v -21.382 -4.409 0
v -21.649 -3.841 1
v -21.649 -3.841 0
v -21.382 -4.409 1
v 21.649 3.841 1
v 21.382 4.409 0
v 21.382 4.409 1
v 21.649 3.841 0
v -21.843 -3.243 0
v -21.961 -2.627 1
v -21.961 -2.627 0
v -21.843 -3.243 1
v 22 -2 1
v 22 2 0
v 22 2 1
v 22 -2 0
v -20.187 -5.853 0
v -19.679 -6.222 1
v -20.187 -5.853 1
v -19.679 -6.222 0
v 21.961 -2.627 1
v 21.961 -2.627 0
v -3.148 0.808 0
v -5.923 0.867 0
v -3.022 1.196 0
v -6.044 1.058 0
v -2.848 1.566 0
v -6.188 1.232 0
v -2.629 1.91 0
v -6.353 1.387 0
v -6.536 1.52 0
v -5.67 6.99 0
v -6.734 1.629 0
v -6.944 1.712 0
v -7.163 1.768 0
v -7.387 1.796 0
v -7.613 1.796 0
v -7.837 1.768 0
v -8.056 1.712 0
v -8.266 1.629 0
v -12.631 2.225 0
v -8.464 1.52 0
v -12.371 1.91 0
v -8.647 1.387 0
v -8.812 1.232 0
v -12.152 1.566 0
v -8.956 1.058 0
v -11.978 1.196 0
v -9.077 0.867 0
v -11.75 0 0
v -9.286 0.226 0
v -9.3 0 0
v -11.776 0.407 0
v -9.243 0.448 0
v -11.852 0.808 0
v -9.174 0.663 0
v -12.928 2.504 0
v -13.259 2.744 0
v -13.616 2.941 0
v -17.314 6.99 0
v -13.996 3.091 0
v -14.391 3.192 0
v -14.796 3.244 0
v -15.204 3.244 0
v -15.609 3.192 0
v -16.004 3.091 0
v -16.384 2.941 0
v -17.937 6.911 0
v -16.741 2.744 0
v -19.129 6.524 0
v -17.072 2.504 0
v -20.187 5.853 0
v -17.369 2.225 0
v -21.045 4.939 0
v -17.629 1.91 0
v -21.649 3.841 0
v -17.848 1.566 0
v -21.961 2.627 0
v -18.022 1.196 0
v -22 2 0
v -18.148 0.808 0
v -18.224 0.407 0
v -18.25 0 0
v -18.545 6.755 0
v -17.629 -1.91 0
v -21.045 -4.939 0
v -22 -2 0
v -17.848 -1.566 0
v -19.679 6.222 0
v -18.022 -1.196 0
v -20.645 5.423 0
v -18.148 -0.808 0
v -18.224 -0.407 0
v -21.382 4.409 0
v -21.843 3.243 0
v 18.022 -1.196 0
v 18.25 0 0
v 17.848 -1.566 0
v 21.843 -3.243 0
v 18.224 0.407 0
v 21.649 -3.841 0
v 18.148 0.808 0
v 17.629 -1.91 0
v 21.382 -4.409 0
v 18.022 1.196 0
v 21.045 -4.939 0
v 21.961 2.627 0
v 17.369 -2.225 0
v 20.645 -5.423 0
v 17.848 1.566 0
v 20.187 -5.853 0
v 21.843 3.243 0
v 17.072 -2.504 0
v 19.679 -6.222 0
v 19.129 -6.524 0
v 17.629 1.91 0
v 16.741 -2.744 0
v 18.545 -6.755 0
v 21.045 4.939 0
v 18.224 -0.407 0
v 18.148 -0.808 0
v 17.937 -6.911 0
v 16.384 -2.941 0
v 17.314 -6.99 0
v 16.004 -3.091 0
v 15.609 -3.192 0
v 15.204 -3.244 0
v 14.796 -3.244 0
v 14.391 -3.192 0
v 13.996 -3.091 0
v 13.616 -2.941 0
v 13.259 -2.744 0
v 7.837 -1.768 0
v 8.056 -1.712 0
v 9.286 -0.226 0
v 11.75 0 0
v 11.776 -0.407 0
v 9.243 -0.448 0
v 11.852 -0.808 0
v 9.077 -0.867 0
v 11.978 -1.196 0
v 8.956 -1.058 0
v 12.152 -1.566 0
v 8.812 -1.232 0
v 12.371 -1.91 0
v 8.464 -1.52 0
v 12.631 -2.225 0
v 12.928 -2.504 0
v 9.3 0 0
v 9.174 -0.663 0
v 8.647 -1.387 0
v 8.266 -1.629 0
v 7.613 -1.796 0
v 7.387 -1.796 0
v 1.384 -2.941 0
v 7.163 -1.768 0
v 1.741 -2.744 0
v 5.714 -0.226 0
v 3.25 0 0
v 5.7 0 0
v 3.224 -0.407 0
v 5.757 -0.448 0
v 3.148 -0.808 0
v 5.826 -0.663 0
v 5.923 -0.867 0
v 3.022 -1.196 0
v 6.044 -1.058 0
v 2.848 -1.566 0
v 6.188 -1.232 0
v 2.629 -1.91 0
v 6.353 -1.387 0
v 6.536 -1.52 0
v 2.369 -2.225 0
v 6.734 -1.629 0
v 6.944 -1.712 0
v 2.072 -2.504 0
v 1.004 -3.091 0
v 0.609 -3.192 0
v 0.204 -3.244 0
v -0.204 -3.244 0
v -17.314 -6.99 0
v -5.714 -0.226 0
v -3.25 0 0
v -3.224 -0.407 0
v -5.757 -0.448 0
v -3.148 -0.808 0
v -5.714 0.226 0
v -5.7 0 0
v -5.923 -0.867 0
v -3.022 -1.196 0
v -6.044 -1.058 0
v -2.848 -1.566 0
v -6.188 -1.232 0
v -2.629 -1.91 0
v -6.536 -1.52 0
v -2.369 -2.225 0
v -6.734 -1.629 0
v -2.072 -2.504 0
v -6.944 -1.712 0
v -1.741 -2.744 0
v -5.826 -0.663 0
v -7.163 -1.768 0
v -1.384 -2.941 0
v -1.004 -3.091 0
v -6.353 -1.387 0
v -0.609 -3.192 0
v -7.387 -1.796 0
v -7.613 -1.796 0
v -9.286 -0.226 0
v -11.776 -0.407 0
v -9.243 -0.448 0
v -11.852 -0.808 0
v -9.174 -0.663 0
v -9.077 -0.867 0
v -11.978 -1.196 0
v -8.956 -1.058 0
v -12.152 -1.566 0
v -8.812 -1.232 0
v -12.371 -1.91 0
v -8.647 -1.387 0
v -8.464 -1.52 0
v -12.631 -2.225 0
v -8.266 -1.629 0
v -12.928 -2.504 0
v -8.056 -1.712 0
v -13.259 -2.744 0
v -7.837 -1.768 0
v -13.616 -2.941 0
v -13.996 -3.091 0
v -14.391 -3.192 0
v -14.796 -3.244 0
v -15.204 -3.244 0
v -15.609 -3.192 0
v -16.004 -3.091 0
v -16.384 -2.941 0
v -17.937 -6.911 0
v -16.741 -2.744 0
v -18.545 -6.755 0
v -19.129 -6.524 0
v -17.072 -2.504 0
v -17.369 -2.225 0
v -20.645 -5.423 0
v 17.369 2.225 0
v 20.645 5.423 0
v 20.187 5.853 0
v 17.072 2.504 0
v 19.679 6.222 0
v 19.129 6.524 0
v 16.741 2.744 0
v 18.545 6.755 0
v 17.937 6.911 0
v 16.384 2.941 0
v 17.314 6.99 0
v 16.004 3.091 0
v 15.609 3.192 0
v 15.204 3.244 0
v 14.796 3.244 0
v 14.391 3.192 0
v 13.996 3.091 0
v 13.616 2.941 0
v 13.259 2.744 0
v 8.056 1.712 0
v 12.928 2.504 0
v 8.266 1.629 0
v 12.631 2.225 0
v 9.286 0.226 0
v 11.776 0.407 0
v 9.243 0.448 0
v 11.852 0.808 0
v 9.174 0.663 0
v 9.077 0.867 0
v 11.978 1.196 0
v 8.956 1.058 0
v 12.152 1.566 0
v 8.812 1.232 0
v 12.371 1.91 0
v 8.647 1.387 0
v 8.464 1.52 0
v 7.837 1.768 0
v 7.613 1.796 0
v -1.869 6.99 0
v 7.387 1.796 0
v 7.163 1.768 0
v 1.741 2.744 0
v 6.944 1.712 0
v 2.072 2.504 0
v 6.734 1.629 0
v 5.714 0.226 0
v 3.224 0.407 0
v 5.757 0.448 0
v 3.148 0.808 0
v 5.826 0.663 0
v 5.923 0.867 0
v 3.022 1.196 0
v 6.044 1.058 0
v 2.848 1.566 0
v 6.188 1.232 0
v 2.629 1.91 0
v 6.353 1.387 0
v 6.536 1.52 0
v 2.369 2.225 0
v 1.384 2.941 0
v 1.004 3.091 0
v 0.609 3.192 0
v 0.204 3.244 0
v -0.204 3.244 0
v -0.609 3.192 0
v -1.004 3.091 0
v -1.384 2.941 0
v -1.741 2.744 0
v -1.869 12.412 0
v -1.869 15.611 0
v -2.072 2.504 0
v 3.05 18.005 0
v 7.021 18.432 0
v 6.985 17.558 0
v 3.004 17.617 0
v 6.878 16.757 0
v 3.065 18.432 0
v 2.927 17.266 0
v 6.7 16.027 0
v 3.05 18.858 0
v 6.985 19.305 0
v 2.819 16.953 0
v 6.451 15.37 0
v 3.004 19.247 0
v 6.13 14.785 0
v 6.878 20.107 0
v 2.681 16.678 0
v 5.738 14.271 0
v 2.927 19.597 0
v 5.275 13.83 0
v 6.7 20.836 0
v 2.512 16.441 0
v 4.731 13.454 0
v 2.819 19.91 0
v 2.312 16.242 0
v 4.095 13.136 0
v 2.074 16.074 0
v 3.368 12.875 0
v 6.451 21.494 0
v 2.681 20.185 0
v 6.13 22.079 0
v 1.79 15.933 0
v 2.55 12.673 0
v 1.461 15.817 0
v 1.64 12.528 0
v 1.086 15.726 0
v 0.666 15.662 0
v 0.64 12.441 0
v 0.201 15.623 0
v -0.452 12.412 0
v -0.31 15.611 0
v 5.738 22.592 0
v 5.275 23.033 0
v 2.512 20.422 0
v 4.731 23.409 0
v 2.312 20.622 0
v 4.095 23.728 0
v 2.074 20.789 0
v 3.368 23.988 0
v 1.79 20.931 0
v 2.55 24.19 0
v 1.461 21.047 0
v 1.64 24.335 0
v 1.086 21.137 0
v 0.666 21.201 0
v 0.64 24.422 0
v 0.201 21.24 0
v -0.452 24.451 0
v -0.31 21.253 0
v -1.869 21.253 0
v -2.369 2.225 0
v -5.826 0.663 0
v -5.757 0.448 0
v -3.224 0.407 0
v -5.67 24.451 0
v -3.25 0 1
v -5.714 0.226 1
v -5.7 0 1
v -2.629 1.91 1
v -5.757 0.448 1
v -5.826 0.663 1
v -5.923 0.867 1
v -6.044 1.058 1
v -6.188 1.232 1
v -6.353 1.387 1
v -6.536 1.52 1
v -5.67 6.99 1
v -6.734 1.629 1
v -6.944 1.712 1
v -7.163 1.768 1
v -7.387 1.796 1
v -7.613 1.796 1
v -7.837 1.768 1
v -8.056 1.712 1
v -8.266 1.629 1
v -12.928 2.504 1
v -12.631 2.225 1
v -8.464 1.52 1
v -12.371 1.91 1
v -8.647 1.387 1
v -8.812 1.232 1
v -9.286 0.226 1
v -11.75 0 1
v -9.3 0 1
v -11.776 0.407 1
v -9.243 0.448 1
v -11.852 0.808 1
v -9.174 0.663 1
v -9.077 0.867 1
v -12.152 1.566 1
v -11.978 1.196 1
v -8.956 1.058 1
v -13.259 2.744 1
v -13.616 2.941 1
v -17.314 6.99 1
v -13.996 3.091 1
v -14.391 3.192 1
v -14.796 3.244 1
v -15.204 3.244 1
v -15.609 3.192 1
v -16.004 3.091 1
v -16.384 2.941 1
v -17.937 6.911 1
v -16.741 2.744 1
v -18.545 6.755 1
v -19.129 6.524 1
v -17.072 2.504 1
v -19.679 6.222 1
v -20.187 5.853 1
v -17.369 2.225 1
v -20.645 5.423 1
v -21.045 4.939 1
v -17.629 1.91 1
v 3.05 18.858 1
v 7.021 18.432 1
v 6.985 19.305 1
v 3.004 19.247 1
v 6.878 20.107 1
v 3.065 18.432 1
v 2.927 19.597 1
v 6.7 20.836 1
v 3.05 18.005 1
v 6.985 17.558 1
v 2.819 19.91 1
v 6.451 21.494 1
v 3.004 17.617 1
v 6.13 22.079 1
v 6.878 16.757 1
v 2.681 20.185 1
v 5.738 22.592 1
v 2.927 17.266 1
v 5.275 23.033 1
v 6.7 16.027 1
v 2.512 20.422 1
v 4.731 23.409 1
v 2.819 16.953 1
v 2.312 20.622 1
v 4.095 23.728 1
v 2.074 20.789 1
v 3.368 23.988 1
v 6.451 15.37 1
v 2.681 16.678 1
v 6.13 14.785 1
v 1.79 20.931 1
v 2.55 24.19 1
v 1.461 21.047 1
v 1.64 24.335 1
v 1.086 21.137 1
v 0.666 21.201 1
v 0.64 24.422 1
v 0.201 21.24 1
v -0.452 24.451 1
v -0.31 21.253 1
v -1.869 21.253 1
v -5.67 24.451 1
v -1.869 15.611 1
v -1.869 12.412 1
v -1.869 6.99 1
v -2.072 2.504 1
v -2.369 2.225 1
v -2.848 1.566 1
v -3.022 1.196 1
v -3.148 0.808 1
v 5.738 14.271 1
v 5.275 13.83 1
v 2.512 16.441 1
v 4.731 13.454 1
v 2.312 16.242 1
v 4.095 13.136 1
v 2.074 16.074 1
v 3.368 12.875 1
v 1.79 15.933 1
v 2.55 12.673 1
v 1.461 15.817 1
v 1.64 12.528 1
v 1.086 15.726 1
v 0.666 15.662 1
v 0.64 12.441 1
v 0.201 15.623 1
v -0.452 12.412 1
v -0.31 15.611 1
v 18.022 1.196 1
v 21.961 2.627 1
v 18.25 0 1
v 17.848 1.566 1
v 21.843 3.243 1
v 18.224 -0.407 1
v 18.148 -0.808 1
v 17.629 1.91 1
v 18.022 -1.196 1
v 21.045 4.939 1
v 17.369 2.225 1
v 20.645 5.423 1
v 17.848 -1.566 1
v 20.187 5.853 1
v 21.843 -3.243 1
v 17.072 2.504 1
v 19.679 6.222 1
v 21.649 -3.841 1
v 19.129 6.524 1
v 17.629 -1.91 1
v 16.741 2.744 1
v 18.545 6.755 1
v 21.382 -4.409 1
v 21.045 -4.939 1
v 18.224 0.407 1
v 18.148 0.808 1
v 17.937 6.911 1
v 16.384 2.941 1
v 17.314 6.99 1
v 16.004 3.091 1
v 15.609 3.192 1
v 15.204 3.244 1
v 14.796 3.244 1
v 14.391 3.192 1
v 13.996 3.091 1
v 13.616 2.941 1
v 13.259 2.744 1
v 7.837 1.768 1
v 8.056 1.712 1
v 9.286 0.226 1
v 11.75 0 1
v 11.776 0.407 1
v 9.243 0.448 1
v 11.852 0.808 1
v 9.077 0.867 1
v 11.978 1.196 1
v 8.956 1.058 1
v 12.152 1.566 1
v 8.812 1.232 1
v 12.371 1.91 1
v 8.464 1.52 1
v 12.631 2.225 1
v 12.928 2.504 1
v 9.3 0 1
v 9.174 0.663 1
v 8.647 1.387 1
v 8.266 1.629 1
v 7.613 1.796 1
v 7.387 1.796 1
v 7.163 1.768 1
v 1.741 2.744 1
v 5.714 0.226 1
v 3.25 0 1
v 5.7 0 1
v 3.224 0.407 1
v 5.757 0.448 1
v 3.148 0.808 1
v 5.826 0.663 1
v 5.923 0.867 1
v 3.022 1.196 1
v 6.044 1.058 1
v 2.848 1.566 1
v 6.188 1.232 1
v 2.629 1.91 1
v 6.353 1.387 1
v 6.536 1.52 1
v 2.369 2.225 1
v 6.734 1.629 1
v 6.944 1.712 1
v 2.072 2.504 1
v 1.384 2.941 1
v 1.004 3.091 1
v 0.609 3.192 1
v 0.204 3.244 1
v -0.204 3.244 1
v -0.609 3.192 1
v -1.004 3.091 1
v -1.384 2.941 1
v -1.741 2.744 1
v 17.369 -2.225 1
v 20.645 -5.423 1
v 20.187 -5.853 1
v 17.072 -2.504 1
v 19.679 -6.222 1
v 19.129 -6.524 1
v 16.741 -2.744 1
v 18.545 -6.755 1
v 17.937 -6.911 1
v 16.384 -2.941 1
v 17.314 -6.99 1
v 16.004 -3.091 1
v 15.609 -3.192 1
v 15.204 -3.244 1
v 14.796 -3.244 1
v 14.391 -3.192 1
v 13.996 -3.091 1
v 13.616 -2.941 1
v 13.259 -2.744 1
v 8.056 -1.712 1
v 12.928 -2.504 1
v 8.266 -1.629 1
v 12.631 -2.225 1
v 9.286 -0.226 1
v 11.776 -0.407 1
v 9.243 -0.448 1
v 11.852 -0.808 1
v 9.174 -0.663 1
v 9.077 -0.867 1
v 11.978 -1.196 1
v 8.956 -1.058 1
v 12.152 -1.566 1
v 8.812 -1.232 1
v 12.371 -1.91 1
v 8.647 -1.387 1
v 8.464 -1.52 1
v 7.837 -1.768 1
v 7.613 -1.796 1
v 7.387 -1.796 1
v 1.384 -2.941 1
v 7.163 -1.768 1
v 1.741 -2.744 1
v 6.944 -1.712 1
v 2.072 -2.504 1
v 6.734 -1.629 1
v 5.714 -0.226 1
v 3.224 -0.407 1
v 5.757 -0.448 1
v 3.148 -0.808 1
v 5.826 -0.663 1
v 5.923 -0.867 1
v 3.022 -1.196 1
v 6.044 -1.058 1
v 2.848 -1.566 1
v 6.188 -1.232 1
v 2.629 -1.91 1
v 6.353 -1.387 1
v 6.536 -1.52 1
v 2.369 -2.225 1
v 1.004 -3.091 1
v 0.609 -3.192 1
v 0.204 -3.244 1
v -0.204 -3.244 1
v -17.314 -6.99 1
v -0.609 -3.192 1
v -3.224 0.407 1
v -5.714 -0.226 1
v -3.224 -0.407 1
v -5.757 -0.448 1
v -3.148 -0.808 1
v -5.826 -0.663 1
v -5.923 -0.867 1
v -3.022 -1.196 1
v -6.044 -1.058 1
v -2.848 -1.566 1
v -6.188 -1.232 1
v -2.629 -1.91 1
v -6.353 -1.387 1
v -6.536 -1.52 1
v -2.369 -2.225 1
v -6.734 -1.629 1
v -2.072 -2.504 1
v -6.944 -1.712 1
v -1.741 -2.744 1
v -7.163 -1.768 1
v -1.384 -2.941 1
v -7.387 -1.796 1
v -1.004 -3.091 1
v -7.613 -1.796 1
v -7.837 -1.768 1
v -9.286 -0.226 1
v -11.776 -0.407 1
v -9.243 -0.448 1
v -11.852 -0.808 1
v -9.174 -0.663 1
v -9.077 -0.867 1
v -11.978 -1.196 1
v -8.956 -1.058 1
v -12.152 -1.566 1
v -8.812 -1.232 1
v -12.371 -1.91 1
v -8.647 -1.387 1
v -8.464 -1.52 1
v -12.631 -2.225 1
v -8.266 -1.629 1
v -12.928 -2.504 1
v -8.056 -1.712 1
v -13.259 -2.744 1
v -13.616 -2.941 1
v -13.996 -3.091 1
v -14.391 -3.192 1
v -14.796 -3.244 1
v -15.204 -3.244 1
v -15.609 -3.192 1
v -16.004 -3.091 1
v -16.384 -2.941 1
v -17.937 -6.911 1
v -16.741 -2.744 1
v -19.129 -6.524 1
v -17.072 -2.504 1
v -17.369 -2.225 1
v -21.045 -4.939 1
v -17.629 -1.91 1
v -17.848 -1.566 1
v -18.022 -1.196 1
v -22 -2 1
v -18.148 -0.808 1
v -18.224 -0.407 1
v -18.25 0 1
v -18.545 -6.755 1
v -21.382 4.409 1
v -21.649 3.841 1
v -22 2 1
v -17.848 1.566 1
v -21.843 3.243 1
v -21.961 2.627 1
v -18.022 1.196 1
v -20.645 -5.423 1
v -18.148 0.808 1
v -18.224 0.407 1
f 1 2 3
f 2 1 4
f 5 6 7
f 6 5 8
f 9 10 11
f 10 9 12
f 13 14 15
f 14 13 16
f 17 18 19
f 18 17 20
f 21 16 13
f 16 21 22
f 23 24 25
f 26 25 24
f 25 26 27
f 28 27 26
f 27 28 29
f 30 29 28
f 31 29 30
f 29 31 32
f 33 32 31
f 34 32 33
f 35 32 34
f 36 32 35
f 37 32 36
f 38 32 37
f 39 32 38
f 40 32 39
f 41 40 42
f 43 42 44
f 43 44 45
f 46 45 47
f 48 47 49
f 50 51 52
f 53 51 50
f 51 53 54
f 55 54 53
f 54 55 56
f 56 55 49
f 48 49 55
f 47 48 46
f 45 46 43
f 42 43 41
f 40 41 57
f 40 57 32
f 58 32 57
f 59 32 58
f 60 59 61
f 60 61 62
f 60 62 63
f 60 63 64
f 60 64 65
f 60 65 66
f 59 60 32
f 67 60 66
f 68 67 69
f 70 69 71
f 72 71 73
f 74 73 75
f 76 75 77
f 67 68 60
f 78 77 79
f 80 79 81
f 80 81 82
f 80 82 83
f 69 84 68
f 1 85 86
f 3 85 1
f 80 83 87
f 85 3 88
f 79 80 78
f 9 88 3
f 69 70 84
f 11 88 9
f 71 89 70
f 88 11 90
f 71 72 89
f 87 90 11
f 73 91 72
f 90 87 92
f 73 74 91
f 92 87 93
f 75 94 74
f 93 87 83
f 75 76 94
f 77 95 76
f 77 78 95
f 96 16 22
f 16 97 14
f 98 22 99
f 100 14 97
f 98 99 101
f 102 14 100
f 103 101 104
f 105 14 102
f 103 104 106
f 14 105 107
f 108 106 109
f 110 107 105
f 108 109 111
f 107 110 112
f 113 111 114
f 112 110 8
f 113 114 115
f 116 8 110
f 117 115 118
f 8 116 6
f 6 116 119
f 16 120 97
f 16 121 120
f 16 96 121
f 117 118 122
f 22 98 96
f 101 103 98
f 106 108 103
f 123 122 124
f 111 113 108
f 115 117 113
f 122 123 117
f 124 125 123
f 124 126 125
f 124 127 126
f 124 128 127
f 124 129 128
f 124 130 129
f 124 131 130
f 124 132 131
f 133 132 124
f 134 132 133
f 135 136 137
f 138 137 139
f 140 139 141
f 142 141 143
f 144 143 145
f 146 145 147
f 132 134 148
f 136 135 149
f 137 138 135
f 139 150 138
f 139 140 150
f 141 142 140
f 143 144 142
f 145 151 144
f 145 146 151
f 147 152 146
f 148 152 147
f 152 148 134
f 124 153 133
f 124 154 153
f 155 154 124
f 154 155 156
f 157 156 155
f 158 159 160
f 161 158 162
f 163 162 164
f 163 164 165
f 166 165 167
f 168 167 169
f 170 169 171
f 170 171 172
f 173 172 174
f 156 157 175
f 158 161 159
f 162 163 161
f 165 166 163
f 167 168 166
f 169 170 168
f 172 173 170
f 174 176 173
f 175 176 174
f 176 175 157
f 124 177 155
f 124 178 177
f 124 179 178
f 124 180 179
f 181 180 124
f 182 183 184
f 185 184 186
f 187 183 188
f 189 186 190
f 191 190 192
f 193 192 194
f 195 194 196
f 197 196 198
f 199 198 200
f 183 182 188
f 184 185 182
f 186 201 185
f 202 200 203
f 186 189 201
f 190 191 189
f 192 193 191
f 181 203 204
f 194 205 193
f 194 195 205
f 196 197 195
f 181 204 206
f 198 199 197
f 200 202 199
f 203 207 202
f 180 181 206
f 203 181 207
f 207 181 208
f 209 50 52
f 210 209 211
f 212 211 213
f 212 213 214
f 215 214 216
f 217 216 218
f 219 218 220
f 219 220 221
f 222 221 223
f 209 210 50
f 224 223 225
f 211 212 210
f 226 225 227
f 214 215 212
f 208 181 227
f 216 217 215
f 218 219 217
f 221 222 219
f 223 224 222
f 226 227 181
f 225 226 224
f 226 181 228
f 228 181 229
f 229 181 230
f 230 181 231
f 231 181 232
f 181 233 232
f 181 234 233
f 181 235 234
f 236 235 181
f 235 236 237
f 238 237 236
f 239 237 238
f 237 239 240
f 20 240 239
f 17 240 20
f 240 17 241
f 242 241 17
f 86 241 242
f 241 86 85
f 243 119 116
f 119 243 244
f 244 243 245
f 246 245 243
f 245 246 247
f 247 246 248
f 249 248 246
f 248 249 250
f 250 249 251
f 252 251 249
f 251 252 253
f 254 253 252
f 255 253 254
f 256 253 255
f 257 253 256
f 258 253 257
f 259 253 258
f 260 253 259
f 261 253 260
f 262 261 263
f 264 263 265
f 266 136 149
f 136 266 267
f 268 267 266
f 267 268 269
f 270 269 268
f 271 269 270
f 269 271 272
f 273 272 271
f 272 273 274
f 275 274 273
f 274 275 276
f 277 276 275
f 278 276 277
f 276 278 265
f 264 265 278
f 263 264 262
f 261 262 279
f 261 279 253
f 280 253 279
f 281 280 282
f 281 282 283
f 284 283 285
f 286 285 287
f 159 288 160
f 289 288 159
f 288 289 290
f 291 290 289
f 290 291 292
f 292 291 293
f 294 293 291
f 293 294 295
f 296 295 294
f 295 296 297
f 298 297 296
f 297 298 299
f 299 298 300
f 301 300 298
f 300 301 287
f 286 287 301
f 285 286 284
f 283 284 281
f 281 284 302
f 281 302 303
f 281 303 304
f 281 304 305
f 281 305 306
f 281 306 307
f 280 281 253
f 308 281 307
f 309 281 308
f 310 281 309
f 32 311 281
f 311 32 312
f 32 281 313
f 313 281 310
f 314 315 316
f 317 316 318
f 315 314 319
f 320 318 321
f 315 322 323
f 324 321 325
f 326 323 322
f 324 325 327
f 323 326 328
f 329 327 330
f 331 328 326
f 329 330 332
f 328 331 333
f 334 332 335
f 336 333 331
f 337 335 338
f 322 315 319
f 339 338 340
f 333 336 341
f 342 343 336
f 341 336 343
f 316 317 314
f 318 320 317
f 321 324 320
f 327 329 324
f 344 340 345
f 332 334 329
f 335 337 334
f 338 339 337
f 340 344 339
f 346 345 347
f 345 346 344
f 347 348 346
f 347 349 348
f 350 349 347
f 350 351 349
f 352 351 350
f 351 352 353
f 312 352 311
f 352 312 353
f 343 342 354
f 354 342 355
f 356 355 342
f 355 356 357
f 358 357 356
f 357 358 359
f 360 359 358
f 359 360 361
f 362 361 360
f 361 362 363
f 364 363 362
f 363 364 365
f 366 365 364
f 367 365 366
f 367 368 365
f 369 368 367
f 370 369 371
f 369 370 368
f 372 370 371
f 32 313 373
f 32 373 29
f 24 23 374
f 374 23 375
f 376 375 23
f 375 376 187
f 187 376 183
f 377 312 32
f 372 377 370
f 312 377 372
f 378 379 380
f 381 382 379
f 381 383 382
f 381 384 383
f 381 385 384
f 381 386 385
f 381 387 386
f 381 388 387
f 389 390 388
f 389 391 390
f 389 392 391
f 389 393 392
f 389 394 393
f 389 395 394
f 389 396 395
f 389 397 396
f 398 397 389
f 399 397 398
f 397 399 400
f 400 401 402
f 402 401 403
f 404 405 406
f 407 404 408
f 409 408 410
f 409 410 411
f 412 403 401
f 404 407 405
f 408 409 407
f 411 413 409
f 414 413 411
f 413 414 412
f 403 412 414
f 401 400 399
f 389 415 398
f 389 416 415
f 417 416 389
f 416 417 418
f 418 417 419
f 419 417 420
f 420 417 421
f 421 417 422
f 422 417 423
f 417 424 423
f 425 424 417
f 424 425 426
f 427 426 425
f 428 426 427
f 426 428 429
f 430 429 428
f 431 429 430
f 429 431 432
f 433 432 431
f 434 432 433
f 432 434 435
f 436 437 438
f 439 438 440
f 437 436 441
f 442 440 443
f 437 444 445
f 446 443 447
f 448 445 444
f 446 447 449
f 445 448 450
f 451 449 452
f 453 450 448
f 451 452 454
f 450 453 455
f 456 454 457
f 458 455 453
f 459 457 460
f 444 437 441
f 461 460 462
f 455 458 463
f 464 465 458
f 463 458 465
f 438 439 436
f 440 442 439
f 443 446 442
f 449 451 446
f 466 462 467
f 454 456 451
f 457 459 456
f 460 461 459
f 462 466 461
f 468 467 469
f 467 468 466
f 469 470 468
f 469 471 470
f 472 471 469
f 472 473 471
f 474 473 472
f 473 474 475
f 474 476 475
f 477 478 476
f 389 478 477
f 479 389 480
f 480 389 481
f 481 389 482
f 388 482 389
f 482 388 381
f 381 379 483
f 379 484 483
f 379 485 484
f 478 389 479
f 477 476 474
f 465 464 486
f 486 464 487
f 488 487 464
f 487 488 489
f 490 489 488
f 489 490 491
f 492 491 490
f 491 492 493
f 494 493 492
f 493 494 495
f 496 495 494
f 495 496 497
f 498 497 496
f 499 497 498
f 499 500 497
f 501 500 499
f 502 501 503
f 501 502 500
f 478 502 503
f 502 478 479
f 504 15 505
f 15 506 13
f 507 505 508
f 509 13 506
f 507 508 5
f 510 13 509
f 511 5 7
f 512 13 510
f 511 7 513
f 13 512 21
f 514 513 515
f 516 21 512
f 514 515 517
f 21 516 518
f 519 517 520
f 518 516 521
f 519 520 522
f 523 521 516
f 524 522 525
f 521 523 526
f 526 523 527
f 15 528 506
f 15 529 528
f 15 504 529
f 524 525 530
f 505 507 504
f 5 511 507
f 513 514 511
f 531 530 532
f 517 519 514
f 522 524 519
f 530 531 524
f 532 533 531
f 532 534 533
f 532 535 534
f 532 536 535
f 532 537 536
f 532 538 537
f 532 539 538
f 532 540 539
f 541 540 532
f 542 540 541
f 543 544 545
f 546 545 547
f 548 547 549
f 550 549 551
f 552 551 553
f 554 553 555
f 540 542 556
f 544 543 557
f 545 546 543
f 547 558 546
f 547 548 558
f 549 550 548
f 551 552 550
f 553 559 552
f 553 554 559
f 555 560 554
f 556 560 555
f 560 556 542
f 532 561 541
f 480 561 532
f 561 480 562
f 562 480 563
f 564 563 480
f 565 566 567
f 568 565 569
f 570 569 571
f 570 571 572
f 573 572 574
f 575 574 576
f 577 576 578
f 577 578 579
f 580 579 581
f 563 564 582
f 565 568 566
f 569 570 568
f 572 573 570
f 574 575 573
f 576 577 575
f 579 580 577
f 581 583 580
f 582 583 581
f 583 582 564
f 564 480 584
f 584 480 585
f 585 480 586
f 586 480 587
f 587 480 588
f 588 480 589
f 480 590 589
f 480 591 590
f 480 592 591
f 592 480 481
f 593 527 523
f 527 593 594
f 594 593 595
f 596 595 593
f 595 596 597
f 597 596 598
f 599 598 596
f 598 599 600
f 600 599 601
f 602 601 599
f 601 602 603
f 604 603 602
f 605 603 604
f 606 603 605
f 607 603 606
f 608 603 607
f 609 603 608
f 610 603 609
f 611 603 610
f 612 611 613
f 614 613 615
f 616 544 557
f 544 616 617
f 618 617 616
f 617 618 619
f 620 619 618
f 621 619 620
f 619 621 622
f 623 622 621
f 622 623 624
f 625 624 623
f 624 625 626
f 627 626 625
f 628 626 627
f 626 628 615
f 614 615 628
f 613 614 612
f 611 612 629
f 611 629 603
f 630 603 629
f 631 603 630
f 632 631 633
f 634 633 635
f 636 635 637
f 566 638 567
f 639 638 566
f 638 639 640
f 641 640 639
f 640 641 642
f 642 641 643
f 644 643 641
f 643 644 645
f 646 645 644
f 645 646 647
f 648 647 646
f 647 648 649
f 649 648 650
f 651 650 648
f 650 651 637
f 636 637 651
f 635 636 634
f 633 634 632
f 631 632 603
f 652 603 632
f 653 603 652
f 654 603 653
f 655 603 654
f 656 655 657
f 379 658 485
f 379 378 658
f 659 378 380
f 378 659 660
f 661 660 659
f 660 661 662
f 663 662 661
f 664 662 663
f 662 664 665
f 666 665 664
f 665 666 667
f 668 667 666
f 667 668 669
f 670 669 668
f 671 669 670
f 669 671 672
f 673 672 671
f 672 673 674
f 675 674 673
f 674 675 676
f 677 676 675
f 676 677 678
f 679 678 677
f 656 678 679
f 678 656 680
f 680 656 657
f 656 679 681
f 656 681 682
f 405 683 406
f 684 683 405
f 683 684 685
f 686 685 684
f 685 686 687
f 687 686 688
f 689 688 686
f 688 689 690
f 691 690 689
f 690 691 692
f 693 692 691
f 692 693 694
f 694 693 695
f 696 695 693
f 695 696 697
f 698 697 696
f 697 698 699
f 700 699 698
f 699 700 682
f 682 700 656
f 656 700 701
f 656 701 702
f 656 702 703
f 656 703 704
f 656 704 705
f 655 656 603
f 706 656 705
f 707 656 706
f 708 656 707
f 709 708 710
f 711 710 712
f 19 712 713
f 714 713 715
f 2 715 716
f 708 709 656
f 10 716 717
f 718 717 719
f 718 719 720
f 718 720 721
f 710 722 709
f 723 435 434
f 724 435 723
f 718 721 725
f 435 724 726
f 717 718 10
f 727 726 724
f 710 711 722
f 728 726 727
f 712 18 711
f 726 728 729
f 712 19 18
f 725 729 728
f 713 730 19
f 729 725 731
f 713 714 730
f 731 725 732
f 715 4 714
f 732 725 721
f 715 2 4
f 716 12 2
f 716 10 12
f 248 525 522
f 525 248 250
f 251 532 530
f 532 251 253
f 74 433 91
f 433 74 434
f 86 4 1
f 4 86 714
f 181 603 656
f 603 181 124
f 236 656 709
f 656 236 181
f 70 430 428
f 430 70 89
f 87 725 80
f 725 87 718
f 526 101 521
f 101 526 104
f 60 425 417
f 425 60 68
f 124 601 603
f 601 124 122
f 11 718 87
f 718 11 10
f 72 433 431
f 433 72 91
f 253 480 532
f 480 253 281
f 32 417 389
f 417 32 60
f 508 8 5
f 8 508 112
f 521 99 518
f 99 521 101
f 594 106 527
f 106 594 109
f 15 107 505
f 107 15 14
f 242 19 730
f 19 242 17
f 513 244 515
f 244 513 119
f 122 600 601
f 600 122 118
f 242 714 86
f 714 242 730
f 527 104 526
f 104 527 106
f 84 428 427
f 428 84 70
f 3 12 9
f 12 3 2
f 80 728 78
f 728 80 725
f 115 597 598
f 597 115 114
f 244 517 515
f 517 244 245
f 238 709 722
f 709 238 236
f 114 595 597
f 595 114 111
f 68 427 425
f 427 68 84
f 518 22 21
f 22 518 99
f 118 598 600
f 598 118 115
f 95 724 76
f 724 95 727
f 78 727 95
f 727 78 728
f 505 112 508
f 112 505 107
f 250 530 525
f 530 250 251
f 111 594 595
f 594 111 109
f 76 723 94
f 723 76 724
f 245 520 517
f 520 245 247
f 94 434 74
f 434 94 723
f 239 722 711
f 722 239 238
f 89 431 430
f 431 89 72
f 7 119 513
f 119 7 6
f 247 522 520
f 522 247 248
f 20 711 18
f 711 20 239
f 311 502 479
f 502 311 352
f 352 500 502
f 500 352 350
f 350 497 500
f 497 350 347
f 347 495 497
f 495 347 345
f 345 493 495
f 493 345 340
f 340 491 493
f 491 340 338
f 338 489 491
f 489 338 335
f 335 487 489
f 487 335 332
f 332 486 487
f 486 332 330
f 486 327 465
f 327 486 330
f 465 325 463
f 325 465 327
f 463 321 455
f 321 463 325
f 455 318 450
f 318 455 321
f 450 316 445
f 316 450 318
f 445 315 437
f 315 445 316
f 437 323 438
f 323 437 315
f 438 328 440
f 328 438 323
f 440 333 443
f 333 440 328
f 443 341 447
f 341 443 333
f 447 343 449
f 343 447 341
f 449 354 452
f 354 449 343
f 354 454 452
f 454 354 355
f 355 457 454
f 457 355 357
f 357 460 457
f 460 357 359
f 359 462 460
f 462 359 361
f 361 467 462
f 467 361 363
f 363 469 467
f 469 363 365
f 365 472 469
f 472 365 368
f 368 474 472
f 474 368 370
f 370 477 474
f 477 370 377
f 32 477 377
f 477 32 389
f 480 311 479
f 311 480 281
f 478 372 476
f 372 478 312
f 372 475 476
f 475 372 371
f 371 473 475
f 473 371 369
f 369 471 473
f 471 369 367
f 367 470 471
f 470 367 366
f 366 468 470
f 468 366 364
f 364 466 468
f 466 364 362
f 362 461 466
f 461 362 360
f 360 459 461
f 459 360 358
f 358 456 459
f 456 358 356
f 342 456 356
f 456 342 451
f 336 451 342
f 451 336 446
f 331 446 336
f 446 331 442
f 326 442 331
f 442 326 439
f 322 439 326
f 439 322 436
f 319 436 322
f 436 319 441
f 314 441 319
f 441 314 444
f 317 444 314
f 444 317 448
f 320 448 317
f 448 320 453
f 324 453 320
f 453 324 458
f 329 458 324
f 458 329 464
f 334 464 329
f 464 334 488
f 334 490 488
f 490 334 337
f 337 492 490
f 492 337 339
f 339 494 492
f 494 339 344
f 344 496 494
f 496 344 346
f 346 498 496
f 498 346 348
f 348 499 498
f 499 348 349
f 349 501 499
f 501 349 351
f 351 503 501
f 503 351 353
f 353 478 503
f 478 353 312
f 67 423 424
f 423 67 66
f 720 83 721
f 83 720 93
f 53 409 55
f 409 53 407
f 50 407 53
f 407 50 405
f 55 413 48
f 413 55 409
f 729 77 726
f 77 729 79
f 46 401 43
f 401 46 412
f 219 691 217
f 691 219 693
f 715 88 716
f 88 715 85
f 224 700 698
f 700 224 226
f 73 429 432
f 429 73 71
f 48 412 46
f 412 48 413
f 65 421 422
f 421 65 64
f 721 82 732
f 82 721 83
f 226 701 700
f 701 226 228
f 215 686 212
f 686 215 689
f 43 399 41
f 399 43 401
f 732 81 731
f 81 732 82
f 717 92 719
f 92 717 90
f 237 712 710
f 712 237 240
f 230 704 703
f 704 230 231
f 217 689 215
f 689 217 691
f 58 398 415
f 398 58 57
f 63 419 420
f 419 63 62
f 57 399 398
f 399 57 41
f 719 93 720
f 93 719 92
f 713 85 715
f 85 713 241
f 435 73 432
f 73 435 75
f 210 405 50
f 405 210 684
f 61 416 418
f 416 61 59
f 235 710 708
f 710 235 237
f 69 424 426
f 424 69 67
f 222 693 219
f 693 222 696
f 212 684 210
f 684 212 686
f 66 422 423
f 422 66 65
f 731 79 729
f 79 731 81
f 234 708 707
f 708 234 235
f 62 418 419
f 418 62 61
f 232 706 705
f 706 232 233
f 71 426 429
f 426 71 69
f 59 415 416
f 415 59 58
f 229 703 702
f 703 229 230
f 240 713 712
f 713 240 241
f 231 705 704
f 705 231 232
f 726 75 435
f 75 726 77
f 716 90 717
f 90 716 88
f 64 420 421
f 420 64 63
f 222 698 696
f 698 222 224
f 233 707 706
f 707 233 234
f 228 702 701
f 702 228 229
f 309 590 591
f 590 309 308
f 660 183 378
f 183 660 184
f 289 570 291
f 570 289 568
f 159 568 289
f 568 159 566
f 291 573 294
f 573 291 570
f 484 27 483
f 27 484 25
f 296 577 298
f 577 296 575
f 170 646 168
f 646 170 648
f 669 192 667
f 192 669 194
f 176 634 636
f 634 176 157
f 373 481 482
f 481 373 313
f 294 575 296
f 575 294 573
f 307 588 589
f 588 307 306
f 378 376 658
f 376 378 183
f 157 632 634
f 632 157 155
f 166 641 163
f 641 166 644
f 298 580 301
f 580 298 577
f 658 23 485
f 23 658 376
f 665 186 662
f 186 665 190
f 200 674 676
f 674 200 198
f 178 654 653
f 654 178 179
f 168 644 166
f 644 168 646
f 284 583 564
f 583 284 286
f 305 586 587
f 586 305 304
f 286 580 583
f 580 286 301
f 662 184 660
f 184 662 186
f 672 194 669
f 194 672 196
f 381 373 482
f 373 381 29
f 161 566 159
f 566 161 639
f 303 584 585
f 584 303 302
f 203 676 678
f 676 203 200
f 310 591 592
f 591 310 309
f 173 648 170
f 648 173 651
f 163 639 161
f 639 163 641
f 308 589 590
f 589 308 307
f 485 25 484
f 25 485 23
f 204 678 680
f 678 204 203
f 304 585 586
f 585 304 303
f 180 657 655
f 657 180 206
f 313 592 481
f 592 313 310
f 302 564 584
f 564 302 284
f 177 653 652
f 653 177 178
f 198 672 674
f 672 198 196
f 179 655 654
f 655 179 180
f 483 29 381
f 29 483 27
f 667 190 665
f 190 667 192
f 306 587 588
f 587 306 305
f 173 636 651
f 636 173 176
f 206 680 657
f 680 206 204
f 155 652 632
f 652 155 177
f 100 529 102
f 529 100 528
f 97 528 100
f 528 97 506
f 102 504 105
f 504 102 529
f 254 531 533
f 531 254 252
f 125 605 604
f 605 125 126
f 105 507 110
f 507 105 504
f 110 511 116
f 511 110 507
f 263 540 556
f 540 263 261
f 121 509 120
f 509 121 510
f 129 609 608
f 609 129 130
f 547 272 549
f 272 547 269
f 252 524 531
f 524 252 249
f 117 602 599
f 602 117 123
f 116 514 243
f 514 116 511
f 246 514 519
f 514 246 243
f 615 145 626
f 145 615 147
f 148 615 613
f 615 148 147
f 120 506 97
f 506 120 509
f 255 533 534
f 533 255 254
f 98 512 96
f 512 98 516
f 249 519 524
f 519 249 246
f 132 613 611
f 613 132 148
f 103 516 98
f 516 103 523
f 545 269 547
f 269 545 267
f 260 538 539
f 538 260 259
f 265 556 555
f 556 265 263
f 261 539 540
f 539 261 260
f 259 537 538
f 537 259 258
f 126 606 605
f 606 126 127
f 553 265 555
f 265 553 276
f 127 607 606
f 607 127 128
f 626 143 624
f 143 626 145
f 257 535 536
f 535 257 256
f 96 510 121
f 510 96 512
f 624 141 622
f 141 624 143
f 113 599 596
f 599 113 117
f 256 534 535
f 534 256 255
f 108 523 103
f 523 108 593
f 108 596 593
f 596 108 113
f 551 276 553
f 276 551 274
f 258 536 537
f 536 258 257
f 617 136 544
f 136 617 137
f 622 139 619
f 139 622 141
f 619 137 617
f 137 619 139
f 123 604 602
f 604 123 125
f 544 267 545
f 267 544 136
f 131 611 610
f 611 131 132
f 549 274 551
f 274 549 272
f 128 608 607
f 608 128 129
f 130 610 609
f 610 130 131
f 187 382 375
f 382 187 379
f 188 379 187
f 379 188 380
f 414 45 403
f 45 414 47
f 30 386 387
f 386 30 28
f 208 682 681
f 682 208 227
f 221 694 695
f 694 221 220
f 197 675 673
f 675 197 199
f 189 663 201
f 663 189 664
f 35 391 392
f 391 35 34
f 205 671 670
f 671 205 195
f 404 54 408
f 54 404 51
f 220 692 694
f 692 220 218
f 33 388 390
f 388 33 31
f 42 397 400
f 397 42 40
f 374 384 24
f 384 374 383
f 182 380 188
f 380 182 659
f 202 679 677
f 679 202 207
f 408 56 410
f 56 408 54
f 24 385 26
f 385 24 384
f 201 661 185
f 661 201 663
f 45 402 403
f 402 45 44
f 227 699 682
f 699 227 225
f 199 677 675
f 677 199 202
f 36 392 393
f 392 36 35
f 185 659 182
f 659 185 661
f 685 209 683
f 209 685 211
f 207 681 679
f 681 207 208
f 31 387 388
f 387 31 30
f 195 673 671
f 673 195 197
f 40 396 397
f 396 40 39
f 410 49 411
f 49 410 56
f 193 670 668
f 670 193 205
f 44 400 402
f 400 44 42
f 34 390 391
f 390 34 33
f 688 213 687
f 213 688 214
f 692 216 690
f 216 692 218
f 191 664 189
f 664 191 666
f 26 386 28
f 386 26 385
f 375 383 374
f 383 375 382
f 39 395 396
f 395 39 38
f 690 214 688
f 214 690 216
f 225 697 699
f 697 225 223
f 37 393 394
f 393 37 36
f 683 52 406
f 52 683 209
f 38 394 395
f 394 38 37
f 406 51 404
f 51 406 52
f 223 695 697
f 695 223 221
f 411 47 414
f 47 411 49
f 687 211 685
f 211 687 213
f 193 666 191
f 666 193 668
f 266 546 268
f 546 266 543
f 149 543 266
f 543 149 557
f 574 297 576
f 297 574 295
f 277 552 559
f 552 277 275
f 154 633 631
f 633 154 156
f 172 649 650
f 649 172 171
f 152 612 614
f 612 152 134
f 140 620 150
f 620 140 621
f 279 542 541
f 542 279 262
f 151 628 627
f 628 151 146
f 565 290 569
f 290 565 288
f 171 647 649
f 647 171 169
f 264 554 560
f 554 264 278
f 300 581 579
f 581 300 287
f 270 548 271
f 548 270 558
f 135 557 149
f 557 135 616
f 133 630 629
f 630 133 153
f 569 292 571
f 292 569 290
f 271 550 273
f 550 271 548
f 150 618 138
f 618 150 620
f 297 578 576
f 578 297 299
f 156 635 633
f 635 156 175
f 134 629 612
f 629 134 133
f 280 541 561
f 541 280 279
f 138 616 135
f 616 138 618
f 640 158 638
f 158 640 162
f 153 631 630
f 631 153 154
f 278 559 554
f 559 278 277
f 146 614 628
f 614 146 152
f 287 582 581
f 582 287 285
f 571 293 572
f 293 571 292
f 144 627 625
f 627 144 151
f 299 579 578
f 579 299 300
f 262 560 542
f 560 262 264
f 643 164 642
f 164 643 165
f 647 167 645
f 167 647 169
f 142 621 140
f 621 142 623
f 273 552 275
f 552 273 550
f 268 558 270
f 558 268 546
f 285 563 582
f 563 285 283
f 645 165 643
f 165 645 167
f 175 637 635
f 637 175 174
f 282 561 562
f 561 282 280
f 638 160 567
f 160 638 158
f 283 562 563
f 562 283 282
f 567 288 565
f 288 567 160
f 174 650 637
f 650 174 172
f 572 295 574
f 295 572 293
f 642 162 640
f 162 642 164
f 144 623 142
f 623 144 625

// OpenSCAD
$fn = 50;


difference() {
	union() {
		hull() {
			translate(v = [-17.0000000000, 2.0000000000, 0]) {
				cylinder(h = 1, r = 5);
			}
			translate(v = [17.0000000000, 2.0000000000, 0]) {
				cylinder(h = 1, r = 5);
			}
			translate(v = [-17.0000000000, -2.0000000000, 0]) {
				cylinder(h = 1, r = 5);
			}
			translate(v = [17.0000000000, -2.0000000000, 0]) {
				cylinder(h = 1, r = 5);
			}
		}
		translate(v = [0, 24, 0]) {
			linear_extrude(height = 1) {
				text(font = "DejaVu Sans Mono:style=Bold", halign = "center", size = 19.0000000000, text = "P", valign = "top");
			}
		}
	}
	union() {
		translate(v = [-15.0000000000, 0.0000000000, 0]) {
			translate(v = [0, 0, -100]) {
				cylinder(h = 200, r = 3.2500000000);
			}
		}
		translate(v = [0, 0, -100]) {
			cylinder(h = 200, r = 3.2500000000);
		}
		translate(v = [15.0000000000, 0.0000000000, 0]) {
			translate(v = [0, 0, -100]) {
				cylinder(h = 200, r = 3.2500000000);
			}
		}
		translate(v = [-15.0000000000, 0.0000000000, 0]) {
			translate(v = [0, 0, -100]) {
				cylinder(h = 200, r = 1.8000000000);
			}
		}
		translate(v = [-7.5000000000, 0.0000000000, 0]) {
			translate(v = [0, 0, -100]) {
				cylinder(h = 200, r = 1.8000000000);
			}
		}
		translate(v = [0, 0, -100]) {
			cylinder(h = 200, r = 1.8000000000);
		}
		translate(v = [7.5000000000, 0.0000000000, 0]) {
			translate(v = [0, 0, -100]) {
				cylinder(h = 200, r = 1.8000000000);
			}
		}
		translate(v = [15.0000000000, 0.0000000000, 0]) {
			translate(v = [0, 0, -100]) {
				cylinder(h = 200, r = 1.8000000000);
			}
		}
	}
}
